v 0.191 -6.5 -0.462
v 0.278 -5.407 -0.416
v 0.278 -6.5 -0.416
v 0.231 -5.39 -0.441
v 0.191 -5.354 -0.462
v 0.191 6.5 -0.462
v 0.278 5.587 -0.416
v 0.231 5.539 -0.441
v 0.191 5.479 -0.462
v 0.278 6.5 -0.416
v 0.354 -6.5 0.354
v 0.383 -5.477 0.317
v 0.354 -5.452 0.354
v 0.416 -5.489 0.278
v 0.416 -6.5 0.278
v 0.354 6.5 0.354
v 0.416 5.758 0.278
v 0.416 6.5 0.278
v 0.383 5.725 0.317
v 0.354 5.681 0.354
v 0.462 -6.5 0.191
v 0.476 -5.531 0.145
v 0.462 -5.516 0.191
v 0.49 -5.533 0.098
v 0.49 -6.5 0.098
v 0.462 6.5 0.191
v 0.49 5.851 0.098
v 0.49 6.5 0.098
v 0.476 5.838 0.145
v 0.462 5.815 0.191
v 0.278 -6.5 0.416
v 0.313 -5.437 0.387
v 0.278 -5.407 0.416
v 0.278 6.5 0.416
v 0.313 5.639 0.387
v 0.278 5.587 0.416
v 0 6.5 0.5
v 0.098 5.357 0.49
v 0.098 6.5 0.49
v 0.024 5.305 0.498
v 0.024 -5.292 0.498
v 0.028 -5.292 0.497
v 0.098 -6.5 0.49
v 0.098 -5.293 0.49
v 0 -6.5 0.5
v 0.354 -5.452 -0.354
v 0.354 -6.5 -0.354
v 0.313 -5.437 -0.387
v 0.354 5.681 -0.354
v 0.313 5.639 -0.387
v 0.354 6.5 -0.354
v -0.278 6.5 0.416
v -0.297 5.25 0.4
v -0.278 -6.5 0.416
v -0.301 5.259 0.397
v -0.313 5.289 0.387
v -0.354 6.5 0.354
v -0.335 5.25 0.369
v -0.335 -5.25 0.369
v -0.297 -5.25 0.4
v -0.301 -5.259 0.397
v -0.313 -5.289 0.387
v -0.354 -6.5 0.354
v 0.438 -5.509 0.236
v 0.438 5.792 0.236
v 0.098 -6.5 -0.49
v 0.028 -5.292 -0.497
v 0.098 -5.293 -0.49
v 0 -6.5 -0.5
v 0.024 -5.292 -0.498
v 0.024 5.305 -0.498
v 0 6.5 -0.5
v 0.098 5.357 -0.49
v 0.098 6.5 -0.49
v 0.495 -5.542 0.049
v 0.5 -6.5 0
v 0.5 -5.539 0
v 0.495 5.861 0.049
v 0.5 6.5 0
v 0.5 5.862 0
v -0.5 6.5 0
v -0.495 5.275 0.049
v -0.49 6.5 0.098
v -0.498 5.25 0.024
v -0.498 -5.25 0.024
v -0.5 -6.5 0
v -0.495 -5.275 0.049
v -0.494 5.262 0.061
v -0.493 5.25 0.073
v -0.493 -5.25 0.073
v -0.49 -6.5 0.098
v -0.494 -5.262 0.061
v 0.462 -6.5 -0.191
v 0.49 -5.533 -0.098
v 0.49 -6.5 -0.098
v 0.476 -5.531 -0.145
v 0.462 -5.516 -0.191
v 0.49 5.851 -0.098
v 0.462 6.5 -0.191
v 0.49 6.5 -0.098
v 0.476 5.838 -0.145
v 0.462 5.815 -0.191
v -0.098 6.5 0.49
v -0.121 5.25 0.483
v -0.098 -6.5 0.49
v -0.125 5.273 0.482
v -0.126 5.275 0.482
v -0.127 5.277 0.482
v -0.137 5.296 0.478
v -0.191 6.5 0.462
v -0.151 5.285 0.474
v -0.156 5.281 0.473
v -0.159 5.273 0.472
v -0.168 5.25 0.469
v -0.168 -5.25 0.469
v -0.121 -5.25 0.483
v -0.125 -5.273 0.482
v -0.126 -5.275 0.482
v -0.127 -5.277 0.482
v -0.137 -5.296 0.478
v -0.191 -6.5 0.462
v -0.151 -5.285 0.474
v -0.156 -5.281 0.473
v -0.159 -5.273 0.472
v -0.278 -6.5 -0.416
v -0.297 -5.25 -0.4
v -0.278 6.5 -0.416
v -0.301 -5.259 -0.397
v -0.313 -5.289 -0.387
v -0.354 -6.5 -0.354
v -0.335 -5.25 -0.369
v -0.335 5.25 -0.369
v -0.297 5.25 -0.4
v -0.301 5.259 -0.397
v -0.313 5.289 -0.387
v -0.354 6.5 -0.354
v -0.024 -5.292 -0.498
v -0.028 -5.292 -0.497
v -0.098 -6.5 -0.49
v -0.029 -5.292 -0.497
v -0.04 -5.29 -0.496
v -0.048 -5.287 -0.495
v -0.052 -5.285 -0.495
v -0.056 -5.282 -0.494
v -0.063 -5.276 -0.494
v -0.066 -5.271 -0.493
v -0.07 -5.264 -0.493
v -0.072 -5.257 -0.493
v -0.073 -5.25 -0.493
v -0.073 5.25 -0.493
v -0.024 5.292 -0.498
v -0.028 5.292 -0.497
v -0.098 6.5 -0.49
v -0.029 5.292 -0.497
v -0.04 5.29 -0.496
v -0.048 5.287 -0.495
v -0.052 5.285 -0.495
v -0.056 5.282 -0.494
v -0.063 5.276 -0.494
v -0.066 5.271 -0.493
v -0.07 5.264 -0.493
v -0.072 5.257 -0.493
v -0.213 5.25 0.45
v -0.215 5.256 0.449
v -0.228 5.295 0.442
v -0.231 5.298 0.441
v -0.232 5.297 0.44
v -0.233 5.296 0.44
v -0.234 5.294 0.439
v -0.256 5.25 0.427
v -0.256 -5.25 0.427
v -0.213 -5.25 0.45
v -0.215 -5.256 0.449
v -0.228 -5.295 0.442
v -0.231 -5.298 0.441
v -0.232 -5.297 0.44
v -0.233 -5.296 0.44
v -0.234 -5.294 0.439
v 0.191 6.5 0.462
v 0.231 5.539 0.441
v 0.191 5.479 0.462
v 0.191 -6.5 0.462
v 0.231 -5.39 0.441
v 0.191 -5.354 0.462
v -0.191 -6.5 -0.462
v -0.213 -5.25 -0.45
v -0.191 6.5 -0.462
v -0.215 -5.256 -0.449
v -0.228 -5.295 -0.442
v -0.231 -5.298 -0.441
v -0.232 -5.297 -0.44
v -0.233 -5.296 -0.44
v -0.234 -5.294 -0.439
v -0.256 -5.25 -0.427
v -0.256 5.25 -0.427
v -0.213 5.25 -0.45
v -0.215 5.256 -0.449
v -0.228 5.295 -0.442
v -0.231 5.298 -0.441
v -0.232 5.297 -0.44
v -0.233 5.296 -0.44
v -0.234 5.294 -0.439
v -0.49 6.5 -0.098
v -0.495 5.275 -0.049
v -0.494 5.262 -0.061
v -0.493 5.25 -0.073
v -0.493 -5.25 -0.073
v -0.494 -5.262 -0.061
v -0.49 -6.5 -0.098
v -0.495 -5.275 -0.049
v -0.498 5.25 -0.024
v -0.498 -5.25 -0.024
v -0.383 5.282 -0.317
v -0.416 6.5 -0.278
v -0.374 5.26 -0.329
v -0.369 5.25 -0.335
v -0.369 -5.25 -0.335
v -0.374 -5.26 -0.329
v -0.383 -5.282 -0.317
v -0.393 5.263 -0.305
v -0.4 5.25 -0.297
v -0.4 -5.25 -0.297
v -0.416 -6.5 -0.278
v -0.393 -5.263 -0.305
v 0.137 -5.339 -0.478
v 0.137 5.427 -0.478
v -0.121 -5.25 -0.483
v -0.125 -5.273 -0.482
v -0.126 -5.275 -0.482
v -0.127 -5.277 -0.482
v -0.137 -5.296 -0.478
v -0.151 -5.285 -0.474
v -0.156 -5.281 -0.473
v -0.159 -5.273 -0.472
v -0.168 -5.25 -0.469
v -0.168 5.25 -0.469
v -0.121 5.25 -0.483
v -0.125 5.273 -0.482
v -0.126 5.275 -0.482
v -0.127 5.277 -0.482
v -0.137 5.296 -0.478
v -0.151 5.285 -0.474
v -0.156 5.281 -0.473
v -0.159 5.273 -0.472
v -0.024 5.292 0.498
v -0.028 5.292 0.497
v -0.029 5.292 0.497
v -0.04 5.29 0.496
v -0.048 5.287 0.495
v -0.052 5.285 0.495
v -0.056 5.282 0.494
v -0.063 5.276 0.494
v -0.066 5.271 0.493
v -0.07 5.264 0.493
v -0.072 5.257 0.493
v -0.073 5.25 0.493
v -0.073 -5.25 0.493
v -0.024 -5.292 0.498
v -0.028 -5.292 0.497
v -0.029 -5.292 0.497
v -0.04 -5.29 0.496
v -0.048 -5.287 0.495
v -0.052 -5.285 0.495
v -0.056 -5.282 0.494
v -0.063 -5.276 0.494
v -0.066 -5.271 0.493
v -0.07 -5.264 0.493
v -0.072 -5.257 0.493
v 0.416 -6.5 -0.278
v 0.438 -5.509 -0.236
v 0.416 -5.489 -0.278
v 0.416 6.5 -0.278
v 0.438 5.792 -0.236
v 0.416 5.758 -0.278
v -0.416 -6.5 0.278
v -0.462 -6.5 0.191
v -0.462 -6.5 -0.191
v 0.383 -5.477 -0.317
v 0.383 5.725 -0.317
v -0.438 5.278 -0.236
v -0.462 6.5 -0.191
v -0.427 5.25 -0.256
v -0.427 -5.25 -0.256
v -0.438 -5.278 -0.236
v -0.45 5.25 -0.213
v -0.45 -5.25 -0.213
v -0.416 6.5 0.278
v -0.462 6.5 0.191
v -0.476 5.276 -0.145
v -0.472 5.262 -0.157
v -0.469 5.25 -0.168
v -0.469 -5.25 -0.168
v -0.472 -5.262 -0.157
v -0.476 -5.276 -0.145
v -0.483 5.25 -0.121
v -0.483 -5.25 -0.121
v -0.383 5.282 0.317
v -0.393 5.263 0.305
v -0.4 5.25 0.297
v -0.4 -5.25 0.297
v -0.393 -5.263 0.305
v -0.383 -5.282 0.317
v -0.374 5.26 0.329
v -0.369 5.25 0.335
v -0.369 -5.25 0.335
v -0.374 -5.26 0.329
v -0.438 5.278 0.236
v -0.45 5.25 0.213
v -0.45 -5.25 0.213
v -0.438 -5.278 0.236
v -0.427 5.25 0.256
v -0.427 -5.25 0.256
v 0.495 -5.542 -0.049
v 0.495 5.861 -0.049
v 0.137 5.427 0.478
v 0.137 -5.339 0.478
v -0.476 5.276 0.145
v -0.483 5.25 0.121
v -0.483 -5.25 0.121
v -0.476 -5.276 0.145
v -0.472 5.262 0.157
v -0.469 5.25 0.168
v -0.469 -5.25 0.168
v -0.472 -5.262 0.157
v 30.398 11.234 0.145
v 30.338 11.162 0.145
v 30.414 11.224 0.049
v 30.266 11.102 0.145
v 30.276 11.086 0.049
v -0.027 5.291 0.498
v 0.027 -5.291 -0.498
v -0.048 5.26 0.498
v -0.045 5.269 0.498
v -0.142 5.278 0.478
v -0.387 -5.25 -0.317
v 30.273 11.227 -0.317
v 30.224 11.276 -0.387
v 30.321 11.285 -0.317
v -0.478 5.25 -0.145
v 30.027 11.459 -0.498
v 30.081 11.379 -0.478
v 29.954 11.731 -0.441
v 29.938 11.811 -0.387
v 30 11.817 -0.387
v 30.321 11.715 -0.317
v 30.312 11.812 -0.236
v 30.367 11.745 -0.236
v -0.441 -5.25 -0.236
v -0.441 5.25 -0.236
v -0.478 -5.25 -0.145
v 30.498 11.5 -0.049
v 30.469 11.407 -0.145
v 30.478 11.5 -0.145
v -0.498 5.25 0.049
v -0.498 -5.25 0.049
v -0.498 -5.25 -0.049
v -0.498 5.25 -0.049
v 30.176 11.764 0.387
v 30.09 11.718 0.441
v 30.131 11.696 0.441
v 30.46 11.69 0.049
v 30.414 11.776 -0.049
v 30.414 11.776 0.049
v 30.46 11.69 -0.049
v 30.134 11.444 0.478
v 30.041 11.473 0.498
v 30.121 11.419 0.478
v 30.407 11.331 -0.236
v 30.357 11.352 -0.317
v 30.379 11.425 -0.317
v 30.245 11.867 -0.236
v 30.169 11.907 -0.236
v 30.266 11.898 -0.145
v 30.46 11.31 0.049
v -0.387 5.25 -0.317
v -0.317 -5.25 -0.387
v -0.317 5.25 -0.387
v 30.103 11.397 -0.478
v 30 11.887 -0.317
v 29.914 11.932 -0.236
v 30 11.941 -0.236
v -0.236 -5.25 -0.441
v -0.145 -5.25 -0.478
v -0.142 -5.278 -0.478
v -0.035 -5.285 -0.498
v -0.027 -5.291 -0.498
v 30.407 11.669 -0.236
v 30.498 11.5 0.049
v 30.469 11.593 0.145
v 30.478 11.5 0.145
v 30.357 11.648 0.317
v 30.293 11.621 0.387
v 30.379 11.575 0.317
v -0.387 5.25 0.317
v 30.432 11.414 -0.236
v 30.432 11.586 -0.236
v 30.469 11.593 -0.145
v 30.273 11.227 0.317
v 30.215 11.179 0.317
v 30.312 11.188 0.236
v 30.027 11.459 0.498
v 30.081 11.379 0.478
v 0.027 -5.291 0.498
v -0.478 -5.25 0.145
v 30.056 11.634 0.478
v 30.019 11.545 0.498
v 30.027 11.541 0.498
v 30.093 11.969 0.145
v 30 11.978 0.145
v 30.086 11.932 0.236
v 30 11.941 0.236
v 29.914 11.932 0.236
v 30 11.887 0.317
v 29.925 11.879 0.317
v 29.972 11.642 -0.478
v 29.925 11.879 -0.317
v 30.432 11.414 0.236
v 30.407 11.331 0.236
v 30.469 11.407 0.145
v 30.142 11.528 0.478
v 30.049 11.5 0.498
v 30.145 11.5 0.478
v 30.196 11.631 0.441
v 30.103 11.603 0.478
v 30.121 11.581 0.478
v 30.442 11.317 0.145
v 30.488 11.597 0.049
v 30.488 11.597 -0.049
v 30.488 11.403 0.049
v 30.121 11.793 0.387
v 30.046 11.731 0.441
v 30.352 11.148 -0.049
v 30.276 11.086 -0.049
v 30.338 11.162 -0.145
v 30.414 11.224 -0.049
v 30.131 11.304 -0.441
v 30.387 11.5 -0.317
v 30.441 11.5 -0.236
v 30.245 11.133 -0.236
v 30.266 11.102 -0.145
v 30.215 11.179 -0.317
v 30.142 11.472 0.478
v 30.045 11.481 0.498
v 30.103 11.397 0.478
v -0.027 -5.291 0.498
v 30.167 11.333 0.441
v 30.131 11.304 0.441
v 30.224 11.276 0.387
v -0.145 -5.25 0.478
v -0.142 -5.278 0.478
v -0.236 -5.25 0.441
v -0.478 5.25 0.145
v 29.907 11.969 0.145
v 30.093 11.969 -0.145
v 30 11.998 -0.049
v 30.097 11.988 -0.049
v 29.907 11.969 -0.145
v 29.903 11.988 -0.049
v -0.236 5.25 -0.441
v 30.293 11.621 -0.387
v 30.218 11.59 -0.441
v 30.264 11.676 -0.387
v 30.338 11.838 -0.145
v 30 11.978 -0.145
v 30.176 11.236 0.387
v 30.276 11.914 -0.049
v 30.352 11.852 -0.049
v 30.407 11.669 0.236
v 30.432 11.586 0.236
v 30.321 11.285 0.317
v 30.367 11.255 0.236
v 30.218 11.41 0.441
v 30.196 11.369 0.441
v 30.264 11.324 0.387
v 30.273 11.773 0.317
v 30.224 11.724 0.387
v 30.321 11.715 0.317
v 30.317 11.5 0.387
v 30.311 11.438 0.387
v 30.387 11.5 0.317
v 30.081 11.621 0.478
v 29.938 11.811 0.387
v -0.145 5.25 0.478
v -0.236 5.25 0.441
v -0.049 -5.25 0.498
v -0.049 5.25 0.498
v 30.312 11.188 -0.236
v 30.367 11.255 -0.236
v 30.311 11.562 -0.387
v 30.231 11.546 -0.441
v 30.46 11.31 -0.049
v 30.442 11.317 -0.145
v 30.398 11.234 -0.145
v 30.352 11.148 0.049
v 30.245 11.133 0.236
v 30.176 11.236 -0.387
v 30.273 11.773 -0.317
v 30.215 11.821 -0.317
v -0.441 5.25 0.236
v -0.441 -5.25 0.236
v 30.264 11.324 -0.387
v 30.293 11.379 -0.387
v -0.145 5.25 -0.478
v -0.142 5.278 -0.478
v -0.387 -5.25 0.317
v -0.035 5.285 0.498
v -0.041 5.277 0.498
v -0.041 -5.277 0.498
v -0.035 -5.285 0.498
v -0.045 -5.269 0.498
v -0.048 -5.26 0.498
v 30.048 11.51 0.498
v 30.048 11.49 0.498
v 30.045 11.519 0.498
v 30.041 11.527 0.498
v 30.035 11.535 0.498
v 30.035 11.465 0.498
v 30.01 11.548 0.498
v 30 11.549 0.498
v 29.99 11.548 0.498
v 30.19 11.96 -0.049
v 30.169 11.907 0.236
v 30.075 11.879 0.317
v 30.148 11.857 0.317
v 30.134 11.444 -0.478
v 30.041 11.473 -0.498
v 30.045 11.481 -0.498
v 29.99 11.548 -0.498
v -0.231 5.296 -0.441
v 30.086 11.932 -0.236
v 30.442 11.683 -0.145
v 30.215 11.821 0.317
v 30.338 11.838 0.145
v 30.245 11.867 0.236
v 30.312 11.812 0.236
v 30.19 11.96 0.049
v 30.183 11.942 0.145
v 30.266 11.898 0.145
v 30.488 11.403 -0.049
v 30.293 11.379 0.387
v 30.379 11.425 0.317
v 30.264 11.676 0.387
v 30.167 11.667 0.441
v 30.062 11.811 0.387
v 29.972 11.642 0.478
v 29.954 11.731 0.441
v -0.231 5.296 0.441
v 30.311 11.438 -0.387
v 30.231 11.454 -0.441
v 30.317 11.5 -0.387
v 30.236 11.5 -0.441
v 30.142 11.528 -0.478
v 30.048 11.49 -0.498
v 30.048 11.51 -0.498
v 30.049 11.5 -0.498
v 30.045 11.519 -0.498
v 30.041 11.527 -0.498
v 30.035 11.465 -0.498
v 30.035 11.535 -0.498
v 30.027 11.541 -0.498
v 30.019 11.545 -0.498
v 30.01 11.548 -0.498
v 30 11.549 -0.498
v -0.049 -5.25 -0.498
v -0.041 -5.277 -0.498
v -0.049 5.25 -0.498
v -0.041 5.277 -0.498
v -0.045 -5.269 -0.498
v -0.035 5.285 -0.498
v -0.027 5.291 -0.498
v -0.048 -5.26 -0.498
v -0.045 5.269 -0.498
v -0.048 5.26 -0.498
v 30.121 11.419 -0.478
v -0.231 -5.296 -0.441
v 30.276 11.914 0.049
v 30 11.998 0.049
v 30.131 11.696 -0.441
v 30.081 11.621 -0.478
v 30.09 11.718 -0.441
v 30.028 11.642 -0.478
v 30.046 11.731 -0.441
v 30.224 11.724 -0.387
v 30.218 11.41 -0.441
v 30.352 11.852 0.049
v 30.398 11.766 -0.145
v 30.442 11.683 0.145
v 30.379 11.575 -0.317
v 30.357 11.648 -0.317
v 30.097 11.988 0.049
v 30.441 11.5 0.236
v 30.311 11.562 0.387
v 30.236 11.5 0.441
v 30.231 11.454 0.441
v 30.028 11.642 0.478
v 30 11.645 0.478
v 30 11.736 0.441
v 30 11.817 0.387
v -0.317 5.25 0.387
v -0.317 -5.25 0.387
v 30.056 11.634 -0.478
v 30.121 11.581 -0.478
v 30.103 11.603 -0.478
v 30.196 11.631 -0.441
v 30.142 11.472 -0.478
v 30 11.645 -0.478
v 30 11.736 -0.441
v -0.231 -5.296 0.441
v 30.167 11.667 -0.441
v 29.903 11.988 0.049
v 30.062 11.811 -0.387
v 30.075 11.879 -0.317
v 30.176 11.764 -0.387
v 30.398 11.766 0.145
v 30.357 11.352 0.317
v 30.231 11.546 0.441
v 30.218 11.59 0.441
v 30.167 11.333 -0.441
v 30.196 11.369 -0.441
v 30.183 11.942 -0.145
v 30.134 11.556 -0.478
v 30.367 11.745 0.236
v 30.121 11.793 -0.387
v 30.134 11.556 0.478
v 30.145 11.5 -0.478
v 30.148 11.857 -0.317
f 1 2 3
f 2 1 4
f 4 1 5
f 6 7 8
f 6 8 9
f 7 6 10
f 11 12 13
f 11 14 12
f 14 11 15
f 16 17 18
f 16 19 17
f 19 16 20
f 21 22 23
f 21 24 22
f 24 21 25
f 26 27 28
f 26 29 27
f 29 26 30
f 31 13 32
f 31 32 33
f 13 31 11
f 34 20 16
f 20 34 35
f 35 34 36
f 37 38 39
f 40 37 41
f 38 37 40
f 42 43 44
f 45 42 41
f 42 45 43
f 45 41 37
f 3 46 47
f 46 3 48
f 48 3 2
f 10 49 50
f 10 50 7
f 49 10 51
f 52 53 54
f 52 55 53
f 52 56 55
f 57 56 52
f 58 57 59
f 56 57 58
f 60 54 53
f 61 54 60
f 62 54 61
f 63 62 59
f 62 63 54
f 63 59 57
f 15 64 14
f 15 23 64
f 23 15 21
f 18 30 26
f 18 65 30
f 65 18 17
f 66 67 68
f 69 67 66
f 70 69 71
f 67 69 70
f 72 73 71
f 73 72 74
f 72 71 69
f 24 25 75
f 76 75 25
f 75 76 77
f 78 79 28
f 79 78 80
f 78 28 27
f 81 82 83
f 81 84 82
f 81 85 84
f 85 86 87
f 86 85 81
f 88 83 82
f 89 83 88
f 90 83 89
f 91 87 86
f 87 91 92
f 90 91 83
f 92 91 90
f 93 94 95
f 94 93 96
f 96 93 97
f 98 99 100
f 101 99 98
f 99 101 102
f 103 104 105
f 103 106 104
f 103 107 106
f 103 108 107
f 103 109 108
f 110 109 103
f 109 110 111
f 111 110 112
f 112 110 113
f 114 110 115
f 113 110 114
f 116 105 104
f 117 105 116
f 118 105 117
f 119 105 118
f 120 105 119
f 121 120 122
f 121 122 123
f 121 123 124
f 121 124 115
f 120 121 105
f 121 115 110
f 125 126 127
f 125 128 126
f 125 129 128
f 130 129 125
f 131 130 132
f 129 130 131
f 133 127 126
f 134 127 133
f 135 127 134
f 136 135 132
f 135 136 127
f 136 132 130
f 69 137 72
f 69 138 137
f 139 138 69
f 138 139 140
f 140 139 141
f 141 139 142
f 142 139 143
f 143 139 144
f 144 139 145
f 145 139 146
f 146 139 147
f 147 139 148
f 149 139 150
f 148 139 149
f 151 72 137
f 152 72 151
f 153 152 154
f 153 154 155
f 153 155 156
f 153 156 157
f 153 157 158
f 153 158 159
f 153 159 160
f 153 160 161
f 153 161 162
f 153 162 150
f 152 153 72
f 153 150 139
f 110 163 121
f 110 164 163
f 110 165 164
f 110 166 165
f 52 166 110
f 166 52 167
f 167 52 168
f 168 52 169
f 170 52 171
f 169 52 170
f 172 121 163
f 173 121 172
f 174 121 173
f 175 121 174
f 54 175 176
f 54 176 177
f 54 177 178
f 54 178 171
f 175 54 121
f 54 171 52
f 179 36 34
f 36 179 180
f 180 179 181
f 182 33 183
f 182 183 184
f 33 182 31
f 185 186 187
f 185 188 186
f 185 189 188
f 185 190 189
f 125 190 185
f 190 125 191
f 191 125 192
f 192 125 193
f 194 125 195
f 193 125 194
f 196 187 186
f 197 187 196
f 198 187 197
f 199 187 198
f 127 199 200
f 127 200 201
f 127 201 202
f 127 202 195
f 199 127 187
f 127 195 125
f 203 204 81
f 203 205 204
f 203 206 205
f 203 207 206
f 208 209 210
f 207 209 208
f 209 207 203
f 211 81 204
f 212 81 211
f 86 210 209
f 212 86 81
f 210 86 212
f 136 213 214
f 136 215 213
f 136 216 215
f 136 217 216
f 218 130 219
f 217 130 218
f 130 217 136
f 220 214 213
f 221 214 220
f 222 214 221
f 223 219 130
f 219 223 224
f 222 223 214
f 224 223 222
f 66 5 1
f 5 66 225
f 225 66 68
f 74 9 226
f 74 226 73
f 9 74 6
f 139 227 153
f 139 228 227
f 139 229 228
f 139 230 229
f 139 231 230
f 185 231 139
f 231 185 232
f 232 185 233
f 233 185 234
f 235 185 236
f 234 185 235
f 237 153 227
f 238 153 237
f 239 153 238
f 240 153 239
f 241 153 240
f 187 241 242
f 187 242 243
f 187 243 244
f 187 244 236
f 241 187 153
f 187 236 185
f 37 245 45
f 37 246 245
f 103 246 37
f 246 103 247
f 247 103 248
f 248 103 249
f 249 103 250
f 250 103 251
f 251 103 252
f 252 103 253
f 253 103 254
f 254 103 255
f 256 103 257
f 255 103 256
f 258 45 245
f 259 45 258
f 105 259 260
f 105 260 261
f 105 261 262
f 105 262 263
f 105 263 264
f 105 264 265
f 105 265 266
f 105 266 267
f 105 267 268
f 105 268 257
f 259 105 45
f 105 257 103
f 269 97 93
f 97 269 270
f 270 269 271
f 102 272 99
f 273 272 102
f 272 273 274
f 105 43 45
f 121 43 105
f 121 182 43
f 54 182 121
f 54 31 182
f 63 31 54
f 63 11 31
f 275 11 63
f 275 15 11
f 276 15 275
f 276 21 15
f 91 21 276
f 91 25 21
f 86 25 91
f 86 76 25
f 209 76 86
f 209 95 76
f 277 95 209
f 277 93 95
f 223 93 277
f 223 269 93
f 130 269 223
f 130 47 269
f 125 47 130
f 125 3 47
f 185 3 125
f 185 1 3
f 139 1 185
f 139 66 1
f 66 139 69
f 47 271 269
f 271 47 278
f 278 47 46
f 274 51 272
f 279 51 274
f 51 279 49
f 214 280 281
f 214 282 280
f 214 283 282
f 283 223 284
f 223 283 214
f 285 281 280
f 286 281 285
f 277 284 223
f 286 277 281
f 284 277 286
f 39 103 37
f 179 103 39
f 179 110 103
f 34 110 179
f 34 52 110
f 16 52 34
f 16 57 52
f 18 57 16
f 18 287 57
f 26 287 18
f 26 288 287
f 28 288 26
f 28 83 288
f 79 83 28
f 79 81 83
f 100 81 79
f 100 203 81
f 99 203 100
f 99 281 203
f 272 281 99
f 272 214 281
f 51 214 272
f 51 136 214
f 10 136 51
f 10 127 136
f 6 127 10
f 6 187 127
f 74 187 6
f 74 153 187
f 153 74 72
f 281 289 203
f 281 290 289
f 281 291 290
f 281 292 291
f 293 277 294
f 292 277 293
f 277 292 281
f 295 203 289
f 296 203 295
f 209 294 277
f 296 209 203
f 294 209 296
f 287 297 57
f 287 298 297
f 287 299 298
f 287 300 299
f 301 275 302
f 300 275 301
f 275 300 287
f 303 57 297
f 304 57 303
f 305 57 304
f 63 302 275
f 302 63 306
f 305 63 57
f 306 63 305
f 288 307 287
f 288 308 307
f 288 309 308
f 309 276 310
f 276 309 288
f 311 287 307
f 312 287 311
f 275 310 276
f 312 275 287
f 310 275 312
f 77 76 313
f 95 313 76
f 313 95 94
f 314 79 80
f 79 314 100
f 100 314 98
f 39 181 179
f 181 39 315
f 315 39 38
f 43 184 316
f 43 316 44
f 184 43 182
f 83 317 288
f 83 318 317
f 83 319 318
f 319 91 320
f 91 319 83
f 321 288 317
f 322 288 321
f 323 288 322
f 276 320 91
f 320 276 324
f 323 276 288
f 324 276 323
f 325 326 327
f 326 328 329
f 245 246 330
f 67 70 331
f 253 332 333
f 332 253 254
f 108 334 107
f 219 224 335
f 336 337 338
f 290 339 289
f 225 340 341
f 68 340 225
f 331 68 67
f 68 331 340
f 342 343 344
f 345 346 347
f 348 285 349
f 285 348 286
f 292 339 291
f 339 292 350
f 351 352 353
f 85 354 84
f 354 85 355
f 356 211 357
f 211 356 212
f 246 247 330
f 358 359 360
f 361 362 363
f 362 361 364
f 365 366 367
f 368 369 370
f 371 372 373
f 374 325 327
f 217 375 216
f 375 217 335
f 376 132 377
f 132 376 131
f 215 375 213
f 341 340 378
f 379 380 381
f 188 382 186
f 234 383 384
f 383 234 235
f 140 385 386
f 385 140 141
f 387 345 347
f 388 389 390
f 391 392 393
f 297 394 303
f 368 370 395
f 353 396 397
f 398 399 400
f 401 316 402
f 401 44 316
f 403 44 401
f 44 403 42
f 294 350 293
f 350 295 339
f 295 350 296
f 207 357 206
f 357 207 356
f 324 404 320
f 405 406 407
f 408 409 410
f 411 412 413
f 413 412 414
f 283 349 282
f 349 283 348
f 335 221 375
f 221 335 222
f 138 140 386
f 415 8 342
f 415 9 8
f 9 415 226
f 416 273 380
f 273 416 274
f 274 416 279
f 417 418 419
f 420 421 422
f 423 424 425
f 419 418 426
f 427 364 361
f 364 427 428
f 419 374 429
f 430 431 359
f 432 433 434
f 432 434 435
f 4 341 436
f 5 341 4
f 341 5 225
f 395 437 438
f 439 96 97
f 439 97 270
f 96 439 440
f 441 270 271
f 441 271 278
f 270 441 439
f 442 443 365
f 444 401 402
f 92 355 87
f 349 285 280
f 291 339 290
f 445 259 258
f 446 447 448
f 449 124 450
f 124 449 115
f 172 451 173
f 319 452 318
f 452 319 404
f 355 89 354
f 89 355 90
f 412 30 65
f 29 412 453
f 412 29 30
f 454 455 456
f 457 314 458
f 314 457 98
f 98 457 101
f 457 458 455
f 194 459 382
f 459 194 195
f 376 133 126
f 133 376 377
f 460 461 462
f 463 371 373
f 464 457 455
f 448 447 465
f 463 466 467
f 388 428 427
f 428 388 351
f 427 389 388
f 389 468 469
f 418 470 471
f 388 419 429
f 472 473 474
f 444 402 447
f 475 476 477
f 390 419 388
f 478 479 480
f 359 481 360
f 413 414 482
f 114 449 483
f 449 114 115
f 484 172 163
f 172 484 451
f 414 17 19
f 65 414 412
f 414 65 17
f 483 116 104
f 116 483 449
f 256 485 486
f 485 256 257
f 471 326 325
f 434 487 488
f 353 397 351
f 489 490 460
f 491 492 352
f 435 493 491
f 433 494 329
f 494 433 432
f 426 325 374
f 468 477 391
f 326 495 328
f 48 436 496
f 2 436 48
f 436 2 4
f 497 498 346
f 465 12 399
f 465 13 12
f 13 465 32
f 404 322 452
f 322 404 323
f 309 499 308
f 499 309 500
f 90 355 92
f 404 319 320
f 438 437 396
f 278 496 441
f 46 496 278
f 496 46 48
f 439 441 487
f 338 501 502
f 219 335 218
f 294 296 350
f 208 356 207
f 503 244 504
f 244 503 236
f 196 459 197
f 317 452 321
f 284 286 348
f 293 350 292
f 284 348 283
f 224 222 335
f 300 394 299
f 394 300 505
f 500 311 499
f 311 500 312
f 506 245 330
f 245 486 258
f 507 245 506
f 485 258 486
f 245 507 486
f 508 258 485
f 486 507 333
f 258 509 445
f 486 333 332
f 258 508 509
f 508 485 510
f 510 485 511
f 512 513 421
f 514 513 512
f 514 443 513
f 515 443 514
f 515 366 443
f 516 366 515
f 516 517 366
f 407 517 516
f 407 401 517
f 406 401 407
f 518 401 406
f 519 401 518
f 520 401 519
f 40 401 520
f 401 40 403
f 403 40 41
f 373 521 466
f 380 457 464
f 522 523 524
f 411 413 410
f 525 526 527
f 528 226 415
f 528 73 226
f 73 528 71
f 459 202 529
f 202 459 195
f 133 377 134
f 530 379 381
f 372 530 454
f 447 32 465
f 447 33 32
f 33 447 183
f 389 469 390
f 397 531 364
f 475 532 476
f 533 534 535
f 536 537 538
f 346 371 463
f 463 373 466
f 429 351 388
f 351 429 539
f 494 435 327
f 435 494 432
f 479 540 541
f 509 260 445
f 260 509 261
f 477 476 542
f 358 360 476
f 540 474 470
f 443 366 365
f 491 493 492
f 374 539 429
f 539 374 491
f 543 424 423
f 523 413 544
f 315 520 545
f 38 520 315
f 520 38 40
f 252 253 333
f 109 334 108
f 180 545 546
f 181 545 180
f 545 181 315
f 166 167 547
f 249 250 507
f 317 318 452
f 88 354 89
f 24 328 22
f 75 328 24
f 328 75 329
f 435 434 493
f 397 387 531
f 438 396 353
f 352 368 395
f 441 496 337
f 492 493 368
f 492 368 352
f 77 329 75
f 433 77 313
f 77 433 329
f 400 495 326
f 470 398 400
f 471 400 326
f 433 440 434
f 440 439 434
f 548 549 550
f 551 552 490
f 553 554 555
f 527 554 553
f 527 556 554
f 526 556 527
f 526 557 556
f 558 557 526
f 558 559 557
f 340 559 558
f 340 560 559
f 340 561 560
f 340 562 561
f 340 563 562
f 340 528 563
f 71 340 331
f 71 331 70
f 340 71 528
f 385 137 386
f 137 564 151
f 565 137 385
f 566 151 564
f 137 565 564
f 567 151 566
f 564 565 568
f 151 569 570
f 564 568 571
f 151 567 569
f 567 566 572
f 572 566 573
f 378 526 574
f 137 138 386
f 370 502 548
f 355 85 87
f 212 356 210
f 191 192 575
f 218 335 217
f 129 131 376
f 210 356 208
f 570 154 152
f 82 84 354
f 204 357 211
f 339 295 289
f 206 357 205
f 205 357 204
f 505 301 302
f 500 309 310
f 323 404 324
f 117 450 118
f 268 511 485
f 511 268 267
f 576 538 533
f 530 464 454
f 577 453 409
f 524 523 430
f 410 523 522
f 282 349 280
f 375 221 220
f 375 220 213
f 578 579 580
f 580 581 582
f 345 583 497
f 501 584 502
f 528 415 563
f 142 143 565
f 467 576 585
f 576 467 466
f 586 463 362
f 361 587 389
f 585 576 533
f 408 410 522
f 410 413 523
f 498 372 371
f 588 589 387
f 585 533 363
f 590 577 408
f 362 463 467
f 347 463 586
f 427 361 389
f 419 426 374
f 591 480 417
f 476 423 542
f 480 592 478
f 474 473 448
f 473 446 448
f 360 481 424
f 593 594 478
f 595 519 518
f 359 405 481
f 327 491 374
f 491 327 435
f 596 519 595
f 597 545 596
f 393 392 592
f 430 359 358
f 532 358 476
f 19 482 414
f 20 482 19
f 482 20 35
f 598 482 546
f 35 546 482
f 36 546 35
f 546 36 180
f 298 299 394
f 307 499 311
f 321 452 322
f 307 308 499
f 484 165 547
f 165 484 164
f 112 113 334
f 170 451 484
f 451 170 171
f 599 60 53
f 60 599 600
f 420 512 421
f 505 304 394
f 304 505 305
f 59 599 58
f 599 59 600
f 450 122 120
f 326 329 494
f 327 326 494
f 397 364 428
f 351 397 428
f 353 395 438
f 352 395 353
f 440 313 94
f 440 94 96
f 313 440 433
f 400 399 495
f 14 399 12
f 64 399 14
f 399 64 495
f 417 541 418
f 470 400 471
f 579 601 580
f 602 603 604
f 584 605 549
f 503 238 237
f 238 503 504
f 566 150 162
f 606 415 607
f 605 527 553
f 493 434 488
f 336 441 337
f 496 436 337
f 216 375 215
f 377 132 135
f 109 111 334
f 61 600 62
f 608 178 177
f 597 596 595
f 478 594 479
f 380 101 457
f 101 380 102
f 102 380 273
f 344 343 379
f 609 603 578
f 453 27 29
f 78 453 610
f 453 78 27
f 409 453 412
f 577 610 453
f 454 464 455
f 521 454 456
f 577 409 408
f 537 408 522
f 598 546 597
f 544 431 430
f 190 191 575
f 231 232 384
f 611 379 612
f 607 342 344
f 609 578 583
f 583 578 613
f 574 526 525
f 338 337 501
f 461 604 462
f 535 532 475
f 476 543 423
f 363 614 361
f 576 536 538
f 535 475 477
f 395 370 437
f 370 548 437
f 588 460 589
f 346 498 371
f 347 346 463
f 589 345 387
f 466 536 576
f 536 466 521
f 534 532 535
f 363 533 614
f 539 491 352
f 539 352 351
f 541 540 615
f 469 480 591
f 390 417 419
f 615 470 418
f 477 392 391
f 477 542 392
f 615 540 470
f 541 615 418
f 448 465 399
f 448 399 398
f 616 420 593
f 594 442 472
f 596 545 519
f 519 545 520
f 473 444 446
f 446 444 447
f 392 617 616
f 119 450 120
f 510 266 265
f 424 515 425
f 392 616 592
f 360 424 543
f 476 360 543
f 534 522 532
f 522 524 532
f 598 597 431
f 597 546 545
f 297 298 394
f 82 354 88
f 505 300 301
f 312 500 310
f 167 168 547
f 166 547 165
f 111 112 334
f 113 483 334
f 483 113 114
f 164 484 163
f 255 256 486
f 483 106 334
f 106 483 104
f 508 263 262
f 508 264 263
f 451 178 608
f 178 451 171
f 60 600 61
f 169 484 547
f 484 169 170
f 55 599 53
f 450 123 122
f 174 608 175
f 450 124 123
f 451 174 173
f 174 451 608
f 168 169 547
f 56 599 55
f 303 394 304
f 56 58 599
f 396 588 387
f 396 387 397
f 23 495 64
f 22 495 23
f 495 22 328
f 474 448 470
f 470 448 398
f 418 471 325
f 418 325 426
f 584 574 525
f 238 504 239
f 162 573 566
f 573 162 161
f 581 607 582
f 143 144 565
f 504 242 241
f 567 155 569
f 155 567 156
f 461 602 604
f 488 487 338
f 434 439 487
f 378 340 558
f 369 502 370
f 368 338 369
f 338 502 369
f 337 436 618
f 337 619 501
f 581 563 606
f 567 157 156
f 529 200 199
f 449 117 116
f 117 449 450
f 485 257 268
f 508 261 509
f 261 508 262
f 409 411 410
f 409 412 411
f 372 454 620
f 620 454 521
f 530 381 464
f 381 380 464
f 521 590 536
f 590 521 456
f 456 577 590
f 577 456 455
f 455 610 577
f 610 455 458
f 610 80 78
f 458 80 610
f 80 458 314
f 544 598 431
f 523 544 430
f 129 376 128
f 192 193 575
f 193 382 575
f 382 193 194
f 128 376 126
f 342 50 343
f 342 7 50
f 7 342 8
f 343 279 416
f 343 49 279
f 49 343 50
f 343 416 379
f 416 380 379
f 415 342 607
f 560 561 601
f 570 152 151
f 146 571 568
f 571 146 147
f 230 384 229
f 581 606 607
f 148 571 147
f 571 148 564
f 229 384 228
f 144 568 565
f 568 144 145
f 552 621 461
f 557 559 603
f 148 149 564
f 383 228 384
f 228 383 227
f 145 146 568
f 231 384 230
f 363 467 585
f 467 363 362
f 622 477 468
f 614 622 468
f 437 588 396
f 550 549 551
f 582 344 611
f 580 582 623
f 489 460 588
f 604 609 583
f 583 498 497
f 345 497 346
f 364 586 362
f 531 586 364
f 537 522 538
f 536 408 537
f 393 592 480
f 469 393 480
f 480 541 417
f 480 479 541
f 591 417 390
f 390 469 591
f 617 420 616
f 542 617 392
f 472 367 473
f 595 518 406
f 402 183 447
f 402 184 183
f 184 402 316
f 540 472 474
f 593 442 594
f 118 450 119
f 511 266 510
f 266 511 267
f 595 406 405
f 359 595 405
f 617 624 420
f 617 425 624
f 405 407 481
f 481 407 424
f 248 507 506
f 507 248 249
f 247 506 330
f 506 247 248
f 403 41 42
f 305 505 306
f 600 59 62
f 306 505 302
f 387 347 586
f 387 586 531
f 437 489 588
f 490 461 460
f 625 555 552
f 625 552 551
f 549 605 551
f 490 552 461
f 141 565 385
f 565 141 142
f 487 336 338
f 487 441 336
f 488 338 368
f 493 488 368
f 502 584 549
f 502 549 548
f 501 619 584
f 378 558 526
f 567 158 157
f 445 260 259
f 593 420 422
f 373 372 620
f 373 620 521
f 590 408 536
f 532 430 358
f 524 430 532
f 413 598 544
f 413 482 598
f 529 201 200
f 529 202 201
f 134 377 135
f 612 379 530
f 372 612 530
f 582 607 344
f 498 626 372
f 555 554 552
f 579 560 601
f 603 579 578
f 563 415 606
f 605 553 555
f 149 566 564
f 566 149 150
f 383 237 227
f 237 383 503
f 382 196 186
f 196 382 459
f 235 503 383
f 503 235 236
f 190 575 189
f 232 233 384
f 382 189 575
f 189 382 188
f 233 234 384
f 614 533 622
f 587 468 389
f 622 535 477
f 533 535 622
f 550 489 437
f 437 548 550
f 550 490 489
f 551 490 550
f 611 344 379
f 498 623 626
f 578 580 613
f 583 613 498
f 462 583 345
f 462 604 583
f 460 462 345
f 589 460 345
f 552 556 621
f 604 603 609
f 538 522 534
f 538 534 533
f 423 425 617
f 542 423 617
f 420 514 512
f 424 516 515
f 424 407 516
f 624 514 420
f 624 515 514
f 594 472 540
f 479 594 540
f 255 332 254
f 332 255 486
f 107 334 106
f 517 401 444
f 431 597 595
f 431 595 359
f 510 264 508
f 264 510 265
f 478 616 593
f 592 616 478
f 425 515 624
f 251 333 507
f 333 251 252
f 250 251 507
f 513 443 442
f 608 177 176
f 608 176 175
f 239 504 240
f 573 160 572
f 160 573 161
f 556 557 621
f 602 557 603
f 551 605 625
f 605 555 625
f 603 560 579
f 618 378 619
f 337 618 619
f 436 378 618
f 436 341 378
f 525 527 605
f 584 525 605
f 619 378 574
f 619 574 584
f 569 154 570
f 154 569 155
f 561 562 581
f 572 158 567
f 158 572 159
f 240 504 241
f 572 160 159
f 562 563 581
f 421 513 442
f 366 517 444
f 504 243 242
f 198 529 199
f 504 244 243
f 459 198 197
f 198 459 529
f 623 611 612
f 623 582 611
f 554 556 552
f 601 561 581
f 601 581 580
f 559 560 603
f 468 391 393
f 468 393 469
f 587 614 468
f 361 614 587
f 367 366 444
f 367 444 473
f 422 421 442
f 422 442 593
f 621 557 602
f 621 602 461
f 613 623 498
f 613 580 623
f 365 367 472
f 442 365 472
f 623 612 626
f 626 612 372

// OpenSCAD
W1=13;
W2=11.5;

L=30;
R=1;

$fn=32;
rotate(90,[R,0,0]) 
cylinder(d=R,h=W1,center=true);

hull(){
translate([0,(W2-R)/2,0])
sphere(d=R);
translate([0,-(W2-R)/2,0])
sphere(d=R);
translate([L,W2,0])
sphere(d=R);
}
